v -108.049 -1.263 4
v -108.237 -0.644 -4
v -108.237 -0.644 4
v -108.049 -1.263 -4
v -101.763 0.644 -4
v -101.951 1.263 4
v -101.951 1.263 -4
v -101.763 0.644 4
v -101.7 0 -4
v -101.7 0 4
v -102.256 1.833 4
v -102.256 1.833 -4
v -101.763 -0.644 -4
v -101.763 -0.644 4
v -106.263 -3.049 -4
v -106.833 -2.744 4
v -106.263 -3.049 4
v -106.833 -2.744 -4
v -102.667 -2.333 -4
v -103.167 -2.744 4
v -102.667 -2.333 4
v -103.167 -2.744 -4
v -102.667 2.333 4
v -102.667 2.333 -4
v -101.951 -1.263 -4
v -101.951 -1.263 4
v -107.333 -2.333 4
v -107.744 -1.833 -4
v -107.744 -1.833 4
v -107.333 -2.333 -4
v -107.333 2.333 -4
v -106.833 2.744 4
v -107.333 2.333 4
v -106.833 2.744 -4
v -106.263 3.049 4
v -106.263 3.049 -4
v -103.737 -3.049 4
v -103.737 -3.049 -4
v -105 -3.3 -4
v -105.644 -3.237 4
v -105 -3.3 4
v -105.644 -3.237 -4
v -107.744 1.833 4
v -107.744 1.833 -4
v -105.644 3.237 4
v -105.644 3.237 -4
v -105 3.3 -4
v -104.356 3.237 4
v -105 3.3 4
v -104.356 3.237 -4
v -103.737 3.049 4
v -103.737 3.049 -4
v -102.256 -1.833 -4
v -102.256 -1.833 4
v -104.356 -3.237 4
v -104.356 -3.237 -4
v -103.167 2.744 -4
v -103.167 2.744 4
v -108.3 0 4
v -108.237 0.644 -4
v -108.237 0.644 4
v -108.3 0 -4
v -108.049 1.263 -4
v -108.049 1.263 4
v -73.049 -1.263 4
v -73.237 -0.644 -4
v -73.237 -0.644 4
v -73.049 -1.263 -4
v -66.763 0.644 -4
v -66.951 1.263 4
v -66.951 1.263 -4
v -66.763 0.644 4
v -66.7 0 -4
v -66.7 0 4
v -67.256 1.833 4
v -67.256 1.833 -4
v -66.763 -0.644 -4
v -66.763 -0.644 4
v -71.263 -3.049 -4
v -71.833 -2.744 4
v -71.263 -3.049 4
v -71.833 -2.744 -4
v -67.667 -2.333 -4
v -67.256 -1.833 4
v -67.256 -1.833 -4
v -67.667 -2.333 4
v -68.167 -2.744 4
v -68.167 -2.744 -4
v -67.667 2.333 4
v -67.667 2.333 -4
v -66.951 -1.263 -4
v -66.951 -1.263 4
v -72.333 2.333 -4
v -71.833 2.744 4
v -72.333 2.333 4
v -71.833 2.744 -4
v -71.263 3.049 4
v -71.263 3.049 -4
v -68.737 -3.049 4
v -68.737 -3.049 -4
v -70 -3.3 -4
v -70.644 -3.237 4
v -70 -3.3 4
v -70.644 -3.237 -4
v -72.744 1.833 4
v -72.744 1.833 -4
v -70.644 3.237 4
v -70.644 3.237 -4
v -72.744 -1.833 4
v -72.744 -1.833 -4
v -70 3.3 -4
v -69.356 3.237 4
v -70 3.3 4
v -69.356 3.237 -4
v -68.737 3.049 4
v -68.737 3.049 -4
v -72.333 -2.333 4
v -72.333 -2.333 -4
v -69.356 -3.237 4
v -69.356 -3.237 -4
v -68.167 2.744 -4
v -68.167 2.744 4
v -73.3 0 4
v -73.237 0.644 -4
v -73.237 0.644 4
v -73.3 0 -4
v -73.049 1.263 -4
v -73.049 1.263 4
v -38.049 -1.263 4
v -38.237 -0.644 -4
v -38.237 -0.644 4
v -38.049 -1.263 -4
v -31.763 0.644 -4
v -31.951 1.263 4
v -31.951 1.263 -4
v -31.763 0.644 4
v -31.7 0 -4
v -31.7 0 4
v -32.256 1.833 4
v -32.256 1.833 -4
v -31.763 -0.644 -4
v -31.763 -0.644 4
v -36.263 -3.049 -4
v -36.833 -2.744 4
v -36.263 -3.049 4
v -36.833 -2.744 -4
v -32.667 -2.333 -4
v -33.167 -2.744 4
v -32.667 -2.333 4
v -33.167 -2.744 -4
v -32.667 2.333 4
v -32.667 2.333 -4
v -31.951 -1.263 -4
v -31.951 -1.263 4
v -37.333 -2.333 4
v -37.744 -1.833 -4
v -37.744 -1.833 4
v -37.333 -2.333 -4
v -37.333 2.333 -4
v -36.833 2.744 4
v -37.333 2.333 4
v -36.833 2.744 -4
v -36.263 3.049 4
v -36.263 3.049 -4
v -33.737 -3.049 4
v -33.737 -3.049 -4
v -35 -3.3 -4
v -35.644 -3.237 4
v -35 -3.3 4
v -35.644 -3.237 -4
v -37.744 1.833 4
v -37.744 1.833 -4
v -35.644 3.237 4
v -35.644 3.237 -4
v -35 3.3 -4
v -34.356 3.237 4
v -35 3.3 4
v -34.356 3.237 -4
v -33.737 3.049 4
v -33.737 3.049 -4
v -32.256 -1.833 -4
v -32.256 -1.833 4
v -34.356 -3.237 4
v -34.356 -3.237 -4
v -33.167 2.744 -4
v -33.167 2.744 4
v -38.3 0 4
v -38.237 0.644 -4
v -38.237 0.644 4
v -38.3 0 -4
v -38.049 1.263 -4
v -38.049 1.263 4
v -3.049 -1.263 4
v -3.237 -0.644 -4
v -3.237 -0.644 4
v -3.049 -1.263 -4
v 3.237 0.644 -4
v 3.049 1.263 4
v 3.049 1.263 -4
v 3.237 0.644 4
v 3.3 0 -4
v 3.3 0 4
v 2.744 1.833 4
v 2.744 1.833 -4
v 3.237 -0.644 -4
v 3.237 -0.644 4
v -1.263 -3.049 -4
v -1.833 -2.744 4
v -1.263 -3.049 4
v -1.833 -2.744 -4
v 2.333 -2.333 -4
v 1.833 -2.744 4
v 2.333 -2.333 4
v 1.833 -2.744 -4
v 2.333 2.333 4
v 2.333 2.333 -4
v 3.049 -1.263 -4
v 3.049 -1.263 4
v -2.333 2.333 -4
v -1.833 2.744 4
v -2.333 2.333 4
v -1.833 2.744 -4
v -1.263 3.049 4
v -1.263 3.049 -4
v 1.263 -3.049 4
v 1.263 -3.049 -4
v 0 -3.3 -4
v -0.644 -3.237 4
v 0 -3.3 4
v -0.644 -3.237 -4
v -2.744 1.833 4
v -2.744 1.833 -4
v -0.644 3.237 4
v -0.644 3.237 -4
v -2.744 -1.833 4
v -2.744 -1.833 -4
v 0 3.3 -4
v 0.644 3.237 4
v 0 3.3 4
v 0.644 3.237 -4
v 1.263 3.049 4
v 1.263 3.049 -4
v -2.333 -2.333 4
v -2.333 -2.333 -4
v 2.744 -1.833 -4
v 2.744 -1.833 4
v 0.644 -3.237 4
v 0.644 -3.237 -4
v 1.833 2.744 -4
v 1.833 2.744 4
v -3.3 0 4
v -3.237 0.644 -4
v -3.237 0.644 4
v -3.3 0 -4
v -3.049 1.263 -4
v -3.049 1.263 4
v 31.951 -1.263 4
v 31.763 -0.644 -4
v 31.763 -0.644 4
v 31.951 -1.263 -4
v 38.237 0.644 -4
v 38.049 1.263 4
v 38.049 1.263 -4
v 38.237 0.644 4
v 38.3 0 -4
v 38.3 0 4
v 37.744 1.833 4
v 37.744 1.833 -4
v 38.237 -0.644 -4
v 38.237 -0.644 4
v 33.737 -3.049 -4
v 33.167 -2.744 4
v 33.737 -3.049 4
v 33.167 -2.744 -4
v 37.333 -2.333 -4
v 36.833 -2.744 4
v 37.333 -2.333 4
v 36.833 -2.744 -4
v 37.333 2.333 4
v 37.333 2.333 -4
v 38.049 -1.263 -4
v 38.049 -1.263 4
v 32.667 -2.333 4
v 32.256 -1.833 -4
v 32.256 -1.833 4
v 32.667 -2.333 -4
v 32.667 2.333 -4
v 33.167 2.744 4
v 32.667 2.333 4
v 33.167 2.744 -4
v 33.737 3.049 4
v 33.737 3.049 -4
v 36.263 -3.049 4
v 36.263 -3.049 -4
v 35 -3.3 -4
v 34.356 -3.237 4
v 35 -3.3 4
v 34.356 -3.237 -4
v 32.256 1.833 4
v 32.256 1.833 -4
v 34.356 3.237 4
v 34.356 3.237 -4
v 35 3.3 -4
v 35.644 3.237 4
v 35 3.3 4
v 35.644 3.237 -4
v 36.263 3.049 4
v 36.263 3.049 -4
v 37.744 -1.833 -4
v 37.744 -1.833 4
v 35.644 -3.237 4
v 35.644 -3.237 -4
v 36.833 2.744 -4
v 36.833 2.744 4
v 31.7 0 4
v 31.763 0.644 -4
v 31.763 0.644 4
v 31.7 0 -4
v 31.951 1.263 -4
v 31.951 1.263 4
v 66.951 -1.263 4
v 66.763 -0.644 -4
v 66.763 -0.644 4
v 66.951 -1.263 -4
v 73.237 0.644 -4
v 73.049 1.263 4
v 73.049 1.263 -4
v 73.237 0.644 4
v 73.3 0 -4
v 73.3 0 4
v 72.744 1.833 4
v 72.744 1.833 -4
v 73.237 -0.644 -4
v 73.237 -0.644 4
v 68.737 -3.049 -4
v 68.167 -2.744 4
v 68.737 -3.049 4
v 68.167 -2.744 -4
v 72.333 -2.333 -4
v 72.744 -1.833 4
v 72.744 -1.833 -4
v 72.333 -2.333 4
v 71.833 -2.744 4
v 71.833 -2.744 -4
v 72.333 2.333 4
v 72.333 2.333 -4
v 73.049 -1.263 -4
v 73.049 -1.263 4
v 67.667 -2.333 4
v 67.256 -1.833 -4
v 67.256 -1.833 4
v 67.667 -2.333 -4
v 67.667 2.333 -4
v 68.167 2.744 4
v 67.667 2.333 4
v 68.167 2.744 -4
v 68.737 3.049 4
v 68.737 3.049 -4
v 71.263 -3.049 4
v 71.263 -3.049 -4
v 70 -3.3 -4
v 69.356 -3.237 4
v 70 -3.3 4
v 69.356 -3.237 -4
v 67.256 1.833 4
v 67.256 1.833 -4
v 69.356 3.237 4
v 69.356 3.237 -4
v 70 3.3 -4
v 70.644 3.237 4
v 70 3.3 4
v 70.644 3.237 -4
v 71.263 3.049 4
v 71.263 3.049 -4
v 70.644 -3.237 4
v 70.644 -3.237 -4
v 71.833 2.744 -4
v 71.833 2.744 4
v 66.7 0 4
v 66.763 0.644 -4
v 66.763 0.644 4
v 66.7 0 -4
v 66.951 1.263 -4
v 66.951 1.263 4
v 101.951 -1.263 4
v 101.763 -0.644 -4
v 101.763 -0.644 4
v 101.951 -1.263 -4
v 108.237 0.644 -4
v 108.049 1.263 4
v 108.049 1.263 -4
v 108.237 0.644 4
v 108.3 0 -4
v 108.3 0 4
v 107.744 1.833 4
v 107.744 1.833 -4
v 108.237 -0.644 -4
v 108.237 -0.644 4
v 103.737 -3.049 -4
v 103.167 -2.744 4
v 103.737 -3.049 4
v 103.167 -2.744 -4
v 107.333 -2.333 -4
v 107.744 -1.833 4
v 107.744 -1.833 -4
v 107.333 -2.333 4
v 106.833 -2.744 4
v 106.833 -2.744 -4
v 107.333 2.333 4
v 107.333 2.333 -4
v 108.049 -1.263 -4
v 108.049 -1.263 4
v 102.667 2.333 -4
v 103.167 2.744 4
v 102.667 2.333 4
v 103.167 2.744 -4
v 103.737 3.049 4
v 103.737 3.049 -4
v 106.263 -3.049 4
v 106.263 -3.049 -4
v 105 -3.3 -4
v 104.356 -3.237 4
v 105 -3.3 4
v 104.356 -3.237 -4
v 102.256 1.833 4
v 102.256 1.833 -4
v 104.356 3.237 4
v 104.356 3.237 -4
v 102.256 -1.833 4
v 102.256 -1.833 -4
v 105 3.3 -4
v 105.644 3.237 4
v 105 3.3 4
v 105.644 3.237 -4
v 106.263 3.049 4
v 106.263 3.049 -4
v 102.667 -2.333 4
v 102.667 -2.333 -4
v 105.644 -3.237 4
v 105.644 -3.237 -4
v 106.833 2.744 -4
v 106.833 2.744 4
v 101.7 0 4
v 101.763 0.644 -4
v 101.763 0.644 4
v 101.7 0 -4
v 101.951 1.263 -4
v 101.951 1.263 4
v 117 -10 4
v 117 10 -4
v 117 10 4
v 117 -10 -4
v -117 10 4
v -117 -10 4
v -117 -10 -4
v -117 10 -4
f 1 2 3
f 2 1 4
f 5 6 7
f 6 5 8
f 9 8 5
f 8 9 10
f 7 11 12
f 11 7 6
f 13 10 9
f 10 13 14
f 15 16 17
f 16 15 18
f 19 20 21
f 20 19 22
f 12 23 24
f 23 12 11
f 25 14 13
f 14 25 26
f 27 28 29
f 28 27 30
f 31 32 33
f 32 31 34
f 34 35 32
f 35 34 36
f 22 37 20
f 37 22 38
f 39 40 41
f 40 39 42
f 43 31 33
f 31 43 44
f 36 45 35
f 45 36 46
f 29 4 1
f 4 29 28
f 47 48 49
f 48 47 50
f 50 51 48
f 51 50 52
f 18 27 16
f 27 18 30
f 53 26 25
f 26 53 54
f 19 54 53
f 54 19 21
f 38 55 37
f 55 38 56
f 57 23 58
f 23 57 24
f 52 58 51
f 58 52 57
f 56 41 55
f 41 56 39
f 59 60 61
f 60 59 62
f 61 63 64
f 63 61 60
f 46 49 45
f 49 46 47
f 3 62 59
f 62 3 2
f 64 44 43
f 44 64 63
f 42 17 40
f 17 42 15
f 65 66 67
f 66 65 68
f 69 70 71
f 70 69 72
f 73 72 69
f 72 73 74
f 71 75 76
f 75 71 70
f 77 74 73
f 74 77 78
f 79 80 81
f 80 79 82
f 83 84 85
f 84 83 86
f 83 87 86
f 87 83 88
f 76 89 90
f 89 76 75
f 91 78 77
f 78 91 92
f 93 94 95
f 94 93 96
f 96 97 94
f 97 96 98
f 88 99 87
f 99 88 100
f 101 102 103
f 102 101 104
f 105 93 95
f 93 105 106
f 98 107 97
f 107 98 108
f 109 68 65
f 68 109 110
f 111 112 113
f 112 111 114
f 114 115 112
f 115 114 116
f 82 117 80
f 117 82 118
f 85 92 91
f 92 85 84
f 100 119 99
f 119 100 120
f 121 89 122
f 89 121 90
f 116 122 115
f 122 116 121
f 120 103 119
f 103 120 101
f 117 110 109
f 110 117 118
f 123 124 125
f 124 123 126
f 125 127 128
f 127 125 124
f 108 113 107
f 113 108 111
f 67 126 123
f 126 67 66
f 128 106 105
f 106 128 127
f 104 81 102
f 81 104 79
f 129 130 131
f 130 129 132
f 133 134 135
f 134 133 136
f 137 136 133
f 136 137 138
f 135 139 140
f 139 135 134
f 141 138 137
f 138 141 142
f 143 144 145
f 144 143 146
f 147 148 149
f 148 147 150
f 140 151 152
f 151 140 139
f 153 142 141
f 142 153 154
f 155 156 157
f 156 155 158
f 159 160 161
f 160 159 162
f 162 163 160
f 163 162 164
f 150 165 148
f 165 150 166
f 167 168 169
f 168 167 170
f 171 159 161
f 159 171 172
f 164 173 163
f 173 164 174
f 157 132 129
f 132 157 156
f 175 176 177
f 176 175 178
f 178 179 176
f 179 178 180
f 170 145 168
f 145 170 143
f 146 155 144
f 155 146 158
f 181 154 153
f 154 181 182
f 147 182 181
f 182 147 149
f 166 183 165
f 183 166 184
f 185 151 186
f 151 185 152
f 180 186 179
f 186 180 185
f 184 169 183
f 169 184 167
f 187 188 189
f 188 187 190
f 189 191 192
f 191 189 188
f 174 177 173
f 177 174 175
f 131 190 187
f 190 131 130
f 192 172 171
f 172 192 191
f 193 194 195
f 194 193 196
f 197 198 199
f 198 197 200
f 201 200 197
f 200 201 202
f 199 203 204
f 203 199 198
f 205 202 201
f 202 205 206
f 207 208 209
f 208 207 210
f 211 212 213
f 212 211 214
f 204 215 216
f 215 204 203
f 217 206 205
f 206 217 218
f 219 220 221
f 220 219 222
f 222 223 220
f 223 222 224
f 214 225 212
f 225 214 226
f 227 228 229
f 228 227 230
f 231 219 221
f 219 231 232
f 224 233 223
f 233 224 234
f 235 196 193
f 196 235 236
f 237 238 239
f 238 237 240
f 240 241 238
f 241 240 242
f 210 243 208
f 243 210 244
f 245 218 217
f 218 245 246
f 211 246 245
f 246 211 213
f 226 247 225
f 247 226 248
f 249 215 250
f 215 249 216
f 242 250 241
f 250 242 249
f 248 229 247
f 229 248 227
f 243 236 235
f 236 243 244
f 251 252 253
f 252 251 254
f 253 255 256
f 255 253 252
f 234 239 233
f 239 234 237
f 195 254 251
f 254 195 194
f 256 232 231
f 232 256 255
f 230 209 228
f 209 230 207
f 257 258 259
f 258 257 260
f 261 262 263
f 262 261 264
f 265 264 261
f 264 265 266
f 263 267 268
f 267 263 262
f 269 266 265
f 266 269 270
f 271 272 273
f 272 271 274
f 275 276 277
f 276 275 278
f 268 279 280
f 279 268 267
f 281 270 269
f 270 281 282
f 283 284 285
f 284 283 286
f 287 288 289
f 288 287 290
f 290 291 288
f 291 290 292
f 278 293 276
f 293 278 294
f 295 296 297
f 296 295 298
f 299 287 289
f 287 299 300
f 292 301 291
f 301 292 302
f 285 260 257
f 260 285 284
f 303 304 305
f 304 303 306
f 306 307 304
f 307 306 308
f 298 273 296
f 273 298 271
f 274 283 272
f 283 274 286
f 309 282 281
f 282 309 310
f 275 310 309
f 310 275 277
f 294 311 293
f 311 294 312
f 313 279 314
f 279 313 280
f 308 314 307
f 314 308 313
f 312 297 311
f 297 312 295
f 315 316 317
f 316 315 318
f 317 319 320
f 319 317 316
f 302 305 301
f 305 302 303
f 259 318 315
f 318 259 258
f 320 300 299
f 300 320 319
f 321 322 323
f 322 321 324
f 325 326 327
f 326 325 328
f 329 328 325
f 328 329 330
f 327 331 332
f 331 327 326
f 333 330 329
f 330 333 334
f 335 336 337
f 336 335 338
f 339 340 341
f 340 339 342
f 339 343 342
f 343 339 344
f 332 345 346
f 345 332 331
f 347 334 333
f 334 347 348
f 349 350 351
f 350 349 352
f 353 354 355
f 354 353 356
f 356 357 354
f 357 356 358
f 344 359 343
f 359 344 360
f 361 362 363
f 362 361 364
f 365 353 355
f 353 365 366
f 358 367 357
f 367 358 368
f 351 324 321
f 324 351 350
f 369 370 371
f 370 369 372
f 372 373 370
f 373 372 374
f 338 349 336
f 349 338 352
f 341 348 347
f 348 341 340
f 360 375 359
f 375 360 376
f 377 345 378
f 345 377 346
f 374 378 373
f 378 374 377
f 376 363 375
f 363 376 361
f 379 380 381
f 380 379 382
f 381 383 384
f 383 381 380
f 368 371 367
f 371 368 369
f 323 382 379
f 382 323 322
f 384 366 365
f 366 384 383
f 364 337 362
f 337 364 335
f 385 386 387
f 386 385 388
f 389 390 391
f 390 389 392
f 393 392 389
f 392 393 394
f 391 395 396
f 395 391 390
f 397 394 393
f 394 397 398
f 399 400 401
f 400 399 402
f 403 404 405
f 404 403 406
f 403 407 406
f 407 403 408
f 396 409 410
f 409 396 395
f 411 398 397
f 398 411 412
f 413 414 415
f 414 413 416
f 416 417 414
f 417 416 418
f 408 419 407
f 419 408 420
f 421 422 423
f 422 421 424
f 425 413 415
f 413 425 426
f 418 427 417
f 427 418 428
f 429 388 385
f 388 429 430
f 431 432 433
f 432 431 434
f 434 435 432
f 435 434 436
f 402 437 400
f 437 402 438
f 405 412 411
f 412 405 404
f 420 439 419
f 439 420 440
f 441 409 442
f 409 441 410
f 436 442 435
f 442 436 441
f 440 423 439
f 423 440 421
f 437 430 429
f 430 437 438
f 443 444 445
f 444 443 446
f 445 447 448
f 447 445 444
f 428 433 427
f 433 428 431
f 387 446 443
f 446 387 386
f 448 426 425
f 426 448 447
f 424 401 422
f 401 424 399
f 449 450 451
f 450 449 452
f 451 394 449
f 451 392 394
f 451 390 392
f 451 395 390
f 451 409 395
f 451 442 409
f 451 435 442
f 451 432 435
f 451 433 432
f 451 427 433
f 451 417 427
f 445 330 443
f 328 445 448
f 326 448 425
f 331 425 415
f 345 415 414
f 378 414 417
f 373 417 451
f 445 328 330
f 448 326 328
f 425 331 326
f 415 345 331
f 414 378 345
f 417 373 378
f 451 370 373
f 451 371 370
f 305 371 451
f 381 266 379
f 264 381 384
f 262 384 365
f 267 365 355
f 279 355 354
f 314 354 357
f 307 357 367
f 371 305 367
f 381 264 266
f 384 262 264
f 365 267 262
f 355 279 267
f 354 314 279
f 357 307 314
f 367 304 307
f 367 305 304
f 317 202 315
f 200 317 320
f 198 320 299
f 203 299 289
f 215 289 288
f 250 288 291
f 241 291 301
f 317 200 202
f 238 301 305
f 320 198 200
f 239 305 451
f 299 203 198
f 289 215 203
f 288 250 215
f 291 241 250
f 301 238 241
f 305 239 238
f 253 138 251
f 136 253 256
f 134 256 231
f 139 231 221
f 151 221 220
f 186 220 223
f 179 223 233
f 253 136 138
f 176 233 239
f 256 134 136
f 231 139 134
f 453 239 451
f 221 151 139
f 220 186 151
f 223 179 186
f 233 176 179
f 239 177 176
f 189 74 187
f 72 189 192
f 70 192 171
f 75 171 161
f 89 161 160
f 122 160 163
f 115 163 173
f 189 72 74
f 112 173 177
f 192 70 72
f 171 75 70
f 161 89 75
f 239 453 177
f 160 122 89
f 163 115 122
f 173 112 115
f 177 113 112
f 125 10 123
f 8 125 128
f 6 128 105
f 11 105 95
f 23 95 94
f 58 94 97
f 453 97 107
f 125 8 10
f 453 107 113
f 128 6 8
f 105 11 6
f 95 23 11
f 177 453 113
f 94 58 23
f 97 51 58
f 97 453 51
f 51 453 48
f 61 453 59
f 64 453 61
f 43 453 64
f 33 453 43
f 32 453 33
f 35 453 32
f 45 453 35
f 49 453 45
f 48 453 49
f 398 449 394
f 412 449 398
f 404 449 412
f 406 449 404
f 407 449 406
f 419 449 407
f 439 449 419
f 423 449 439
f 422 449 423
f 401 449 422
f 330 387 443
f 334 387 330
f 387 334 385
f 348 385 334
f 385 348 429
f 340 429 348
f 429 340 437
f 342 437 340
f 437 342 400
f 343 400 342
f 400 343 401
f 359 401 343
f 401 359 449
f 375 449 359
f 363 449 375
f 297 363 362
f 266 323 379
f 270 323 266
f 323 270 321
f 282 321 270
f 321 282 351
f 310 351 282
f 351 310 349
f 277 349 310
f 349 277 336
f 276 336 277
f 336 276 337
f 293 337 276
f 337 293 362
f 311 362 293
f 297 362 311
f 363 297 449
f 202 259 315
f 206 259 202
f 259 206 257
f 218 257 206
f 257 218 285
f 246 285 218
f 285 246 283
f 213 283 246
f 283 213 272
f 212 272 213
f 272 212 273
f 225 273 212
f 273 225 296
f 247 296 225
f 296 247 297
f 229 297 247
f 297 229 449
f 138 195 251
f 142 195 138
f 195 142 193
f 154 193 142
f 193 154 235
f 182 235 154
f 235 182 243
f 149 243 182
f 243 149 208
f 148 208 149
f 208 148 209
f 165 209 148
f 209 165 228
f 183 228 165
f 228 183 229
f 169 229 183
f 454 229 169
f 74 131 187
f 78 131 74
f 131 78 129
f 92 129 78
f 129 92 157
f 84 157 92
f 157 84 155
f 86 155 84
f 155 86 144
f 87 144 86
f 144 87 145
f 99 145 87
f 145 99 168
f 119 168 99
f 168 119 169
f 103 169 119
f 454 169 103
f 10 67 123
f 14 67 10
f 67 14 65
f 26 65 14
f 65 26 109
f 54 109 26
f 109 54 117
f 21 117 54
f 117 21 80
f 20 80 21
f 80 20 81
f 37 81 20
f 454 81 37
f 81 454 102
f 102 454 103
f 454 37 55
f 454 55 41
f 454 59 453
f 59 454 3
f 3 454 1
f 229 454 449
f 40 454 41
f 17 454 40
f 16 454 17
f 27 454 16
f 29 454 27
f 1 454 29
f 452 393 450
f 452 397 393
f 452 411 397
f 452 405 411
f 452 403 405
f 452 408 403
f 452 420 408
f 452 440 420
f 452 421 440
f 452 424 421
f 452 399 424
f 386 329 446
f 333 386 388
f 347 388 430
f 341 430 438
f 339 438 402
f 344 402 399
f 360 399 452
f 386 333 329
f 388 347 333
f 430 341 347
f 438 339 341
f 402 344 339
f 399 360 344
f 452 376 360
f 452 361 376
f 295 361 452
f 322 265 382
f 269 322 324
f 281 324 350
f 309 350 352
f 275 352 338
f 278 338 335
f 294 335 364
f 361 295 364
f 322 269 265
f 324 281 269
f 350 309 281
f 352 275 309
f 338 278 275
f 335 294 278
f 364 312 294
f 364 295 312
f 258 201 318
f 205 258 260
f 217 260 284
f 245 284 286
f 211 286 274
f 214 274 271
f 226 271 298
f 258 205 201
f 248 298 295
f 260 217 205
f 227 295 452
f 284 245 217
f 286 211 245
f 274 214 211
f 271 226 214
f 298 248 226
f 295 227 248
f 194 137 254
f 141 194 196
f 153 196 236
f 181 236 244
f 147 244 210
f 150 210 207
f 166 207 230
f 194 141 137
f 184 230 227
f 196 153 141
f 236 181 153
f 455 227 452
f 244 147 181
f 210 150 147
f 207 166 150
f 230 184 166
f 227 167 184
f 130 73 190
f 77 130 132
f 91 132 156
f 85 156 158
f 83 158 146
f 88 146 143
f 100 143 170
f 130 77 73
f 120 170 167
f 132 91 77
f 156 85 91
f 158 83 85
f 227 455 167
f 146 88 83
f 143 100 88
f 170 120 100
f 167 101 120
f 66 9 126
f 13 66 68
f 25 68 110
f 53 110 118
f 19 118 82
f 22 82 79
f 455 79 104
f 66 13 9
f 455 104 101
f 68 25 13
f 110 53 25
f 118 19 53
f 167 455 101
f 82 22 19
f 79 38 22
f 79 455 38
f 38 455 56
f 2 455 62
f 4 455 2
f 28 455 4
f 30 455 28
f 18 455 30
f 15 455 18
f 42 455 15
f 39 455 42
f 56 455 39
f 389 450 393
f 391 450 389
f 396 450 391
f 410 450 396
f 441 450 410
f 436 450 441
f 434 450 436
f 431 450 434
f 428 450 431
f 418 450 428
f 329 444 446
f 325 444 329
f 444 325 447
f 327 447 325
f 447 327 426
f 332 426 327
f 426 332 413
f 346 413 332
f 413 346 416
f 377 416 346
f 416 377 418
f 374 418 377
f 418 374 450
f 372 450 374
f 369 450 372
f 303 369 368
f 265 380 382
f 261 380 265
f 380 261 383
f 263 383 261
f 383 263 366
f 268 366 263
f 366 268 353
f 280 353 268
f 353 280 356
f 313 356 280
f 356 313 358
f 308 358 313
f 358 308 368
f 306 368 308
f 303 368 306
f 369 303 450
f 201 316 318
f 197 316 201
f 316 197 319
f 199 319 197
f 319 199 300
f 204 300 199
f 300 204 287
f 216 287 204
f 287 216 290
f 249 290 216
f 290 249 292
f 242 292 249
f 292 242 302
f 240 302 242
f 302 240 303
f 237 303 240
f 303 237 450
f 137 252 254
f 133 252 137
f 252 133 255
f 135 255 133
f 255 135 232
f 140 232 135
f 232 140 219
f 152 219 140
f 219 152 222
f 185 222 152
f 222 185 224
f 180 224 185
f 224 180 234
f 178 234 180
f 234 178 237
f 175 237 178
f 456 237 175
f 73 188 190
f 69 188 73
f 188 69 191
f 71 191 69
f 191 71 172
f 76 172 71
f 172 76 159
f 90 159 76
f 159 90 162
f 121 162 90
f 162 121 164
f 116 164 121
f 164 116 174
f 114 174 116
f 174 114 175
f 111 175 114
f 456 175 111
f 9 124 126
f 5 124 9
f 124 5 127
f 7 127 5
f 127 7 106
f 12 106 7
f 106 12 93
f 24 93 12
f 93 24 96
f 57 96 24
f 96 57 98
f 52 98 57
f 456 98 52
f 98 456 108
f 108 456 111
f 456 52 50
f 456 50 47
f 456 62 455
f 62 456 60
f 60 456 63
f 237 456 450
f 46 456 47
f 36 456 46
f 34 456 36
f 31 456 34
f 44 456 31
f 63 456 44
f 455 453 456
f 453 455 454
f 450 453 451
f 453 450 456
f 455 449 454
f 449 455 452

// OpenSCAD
$fn = 32;

// ----------------------------------------------------------------------
// Hole bar, 7 x Ø6.6
// skip layout, 12 mm edge offset
// ----------------------------------------------------------------------

// --- parameters (mm) ---
bar_w = 20;         // bar width (Y)
bar_t = 8;          // bar thickness (Z)
holes = 7;          // holes per row
hole_d = 6.6;       // hole diameter
edge = 12;          // offset from the bar end to the first hole
grid_pitch = 17.5;  // grid the bar was laid out on

// --- derived feature positions (mm) ---
pitch = grid_pitch * 2;       // = 35   holes sit every other grid slot
span = (holes - 1) * pitch;   // = 210   distance between the end holes
bar_l = span + 2 * edge;      // = 234   overall bar length
start_x = -bar_l / 2 + edge;  // = -105   X of the first hole
feature_centers = [
  [start_x + 0 * pitch, 0],
  [start_x + 1 * pitch, 0],
  [start_x + 2 * pitch, 0],
  [start_x + 3 * pitch, 0],
  [start_x + 4 * pitch, 0],
  [start_x + 5 * pitch, 0],
  [start_x + 6 * pitch, 0]
];   // hole centres of the first row

// bar with one row of holes, drilled from feature_centers
difference() {
  translate([-bar_l / 2, -bar_w / 2, -bar_t / 2]) cube([bar_l, bar_w, bar_t]);
  for (centre = feature_centers)
    translate([centre[0], centre[1], 0])
      cylinder(d = hole_d, h = bar_t + 2, center = true);
}
